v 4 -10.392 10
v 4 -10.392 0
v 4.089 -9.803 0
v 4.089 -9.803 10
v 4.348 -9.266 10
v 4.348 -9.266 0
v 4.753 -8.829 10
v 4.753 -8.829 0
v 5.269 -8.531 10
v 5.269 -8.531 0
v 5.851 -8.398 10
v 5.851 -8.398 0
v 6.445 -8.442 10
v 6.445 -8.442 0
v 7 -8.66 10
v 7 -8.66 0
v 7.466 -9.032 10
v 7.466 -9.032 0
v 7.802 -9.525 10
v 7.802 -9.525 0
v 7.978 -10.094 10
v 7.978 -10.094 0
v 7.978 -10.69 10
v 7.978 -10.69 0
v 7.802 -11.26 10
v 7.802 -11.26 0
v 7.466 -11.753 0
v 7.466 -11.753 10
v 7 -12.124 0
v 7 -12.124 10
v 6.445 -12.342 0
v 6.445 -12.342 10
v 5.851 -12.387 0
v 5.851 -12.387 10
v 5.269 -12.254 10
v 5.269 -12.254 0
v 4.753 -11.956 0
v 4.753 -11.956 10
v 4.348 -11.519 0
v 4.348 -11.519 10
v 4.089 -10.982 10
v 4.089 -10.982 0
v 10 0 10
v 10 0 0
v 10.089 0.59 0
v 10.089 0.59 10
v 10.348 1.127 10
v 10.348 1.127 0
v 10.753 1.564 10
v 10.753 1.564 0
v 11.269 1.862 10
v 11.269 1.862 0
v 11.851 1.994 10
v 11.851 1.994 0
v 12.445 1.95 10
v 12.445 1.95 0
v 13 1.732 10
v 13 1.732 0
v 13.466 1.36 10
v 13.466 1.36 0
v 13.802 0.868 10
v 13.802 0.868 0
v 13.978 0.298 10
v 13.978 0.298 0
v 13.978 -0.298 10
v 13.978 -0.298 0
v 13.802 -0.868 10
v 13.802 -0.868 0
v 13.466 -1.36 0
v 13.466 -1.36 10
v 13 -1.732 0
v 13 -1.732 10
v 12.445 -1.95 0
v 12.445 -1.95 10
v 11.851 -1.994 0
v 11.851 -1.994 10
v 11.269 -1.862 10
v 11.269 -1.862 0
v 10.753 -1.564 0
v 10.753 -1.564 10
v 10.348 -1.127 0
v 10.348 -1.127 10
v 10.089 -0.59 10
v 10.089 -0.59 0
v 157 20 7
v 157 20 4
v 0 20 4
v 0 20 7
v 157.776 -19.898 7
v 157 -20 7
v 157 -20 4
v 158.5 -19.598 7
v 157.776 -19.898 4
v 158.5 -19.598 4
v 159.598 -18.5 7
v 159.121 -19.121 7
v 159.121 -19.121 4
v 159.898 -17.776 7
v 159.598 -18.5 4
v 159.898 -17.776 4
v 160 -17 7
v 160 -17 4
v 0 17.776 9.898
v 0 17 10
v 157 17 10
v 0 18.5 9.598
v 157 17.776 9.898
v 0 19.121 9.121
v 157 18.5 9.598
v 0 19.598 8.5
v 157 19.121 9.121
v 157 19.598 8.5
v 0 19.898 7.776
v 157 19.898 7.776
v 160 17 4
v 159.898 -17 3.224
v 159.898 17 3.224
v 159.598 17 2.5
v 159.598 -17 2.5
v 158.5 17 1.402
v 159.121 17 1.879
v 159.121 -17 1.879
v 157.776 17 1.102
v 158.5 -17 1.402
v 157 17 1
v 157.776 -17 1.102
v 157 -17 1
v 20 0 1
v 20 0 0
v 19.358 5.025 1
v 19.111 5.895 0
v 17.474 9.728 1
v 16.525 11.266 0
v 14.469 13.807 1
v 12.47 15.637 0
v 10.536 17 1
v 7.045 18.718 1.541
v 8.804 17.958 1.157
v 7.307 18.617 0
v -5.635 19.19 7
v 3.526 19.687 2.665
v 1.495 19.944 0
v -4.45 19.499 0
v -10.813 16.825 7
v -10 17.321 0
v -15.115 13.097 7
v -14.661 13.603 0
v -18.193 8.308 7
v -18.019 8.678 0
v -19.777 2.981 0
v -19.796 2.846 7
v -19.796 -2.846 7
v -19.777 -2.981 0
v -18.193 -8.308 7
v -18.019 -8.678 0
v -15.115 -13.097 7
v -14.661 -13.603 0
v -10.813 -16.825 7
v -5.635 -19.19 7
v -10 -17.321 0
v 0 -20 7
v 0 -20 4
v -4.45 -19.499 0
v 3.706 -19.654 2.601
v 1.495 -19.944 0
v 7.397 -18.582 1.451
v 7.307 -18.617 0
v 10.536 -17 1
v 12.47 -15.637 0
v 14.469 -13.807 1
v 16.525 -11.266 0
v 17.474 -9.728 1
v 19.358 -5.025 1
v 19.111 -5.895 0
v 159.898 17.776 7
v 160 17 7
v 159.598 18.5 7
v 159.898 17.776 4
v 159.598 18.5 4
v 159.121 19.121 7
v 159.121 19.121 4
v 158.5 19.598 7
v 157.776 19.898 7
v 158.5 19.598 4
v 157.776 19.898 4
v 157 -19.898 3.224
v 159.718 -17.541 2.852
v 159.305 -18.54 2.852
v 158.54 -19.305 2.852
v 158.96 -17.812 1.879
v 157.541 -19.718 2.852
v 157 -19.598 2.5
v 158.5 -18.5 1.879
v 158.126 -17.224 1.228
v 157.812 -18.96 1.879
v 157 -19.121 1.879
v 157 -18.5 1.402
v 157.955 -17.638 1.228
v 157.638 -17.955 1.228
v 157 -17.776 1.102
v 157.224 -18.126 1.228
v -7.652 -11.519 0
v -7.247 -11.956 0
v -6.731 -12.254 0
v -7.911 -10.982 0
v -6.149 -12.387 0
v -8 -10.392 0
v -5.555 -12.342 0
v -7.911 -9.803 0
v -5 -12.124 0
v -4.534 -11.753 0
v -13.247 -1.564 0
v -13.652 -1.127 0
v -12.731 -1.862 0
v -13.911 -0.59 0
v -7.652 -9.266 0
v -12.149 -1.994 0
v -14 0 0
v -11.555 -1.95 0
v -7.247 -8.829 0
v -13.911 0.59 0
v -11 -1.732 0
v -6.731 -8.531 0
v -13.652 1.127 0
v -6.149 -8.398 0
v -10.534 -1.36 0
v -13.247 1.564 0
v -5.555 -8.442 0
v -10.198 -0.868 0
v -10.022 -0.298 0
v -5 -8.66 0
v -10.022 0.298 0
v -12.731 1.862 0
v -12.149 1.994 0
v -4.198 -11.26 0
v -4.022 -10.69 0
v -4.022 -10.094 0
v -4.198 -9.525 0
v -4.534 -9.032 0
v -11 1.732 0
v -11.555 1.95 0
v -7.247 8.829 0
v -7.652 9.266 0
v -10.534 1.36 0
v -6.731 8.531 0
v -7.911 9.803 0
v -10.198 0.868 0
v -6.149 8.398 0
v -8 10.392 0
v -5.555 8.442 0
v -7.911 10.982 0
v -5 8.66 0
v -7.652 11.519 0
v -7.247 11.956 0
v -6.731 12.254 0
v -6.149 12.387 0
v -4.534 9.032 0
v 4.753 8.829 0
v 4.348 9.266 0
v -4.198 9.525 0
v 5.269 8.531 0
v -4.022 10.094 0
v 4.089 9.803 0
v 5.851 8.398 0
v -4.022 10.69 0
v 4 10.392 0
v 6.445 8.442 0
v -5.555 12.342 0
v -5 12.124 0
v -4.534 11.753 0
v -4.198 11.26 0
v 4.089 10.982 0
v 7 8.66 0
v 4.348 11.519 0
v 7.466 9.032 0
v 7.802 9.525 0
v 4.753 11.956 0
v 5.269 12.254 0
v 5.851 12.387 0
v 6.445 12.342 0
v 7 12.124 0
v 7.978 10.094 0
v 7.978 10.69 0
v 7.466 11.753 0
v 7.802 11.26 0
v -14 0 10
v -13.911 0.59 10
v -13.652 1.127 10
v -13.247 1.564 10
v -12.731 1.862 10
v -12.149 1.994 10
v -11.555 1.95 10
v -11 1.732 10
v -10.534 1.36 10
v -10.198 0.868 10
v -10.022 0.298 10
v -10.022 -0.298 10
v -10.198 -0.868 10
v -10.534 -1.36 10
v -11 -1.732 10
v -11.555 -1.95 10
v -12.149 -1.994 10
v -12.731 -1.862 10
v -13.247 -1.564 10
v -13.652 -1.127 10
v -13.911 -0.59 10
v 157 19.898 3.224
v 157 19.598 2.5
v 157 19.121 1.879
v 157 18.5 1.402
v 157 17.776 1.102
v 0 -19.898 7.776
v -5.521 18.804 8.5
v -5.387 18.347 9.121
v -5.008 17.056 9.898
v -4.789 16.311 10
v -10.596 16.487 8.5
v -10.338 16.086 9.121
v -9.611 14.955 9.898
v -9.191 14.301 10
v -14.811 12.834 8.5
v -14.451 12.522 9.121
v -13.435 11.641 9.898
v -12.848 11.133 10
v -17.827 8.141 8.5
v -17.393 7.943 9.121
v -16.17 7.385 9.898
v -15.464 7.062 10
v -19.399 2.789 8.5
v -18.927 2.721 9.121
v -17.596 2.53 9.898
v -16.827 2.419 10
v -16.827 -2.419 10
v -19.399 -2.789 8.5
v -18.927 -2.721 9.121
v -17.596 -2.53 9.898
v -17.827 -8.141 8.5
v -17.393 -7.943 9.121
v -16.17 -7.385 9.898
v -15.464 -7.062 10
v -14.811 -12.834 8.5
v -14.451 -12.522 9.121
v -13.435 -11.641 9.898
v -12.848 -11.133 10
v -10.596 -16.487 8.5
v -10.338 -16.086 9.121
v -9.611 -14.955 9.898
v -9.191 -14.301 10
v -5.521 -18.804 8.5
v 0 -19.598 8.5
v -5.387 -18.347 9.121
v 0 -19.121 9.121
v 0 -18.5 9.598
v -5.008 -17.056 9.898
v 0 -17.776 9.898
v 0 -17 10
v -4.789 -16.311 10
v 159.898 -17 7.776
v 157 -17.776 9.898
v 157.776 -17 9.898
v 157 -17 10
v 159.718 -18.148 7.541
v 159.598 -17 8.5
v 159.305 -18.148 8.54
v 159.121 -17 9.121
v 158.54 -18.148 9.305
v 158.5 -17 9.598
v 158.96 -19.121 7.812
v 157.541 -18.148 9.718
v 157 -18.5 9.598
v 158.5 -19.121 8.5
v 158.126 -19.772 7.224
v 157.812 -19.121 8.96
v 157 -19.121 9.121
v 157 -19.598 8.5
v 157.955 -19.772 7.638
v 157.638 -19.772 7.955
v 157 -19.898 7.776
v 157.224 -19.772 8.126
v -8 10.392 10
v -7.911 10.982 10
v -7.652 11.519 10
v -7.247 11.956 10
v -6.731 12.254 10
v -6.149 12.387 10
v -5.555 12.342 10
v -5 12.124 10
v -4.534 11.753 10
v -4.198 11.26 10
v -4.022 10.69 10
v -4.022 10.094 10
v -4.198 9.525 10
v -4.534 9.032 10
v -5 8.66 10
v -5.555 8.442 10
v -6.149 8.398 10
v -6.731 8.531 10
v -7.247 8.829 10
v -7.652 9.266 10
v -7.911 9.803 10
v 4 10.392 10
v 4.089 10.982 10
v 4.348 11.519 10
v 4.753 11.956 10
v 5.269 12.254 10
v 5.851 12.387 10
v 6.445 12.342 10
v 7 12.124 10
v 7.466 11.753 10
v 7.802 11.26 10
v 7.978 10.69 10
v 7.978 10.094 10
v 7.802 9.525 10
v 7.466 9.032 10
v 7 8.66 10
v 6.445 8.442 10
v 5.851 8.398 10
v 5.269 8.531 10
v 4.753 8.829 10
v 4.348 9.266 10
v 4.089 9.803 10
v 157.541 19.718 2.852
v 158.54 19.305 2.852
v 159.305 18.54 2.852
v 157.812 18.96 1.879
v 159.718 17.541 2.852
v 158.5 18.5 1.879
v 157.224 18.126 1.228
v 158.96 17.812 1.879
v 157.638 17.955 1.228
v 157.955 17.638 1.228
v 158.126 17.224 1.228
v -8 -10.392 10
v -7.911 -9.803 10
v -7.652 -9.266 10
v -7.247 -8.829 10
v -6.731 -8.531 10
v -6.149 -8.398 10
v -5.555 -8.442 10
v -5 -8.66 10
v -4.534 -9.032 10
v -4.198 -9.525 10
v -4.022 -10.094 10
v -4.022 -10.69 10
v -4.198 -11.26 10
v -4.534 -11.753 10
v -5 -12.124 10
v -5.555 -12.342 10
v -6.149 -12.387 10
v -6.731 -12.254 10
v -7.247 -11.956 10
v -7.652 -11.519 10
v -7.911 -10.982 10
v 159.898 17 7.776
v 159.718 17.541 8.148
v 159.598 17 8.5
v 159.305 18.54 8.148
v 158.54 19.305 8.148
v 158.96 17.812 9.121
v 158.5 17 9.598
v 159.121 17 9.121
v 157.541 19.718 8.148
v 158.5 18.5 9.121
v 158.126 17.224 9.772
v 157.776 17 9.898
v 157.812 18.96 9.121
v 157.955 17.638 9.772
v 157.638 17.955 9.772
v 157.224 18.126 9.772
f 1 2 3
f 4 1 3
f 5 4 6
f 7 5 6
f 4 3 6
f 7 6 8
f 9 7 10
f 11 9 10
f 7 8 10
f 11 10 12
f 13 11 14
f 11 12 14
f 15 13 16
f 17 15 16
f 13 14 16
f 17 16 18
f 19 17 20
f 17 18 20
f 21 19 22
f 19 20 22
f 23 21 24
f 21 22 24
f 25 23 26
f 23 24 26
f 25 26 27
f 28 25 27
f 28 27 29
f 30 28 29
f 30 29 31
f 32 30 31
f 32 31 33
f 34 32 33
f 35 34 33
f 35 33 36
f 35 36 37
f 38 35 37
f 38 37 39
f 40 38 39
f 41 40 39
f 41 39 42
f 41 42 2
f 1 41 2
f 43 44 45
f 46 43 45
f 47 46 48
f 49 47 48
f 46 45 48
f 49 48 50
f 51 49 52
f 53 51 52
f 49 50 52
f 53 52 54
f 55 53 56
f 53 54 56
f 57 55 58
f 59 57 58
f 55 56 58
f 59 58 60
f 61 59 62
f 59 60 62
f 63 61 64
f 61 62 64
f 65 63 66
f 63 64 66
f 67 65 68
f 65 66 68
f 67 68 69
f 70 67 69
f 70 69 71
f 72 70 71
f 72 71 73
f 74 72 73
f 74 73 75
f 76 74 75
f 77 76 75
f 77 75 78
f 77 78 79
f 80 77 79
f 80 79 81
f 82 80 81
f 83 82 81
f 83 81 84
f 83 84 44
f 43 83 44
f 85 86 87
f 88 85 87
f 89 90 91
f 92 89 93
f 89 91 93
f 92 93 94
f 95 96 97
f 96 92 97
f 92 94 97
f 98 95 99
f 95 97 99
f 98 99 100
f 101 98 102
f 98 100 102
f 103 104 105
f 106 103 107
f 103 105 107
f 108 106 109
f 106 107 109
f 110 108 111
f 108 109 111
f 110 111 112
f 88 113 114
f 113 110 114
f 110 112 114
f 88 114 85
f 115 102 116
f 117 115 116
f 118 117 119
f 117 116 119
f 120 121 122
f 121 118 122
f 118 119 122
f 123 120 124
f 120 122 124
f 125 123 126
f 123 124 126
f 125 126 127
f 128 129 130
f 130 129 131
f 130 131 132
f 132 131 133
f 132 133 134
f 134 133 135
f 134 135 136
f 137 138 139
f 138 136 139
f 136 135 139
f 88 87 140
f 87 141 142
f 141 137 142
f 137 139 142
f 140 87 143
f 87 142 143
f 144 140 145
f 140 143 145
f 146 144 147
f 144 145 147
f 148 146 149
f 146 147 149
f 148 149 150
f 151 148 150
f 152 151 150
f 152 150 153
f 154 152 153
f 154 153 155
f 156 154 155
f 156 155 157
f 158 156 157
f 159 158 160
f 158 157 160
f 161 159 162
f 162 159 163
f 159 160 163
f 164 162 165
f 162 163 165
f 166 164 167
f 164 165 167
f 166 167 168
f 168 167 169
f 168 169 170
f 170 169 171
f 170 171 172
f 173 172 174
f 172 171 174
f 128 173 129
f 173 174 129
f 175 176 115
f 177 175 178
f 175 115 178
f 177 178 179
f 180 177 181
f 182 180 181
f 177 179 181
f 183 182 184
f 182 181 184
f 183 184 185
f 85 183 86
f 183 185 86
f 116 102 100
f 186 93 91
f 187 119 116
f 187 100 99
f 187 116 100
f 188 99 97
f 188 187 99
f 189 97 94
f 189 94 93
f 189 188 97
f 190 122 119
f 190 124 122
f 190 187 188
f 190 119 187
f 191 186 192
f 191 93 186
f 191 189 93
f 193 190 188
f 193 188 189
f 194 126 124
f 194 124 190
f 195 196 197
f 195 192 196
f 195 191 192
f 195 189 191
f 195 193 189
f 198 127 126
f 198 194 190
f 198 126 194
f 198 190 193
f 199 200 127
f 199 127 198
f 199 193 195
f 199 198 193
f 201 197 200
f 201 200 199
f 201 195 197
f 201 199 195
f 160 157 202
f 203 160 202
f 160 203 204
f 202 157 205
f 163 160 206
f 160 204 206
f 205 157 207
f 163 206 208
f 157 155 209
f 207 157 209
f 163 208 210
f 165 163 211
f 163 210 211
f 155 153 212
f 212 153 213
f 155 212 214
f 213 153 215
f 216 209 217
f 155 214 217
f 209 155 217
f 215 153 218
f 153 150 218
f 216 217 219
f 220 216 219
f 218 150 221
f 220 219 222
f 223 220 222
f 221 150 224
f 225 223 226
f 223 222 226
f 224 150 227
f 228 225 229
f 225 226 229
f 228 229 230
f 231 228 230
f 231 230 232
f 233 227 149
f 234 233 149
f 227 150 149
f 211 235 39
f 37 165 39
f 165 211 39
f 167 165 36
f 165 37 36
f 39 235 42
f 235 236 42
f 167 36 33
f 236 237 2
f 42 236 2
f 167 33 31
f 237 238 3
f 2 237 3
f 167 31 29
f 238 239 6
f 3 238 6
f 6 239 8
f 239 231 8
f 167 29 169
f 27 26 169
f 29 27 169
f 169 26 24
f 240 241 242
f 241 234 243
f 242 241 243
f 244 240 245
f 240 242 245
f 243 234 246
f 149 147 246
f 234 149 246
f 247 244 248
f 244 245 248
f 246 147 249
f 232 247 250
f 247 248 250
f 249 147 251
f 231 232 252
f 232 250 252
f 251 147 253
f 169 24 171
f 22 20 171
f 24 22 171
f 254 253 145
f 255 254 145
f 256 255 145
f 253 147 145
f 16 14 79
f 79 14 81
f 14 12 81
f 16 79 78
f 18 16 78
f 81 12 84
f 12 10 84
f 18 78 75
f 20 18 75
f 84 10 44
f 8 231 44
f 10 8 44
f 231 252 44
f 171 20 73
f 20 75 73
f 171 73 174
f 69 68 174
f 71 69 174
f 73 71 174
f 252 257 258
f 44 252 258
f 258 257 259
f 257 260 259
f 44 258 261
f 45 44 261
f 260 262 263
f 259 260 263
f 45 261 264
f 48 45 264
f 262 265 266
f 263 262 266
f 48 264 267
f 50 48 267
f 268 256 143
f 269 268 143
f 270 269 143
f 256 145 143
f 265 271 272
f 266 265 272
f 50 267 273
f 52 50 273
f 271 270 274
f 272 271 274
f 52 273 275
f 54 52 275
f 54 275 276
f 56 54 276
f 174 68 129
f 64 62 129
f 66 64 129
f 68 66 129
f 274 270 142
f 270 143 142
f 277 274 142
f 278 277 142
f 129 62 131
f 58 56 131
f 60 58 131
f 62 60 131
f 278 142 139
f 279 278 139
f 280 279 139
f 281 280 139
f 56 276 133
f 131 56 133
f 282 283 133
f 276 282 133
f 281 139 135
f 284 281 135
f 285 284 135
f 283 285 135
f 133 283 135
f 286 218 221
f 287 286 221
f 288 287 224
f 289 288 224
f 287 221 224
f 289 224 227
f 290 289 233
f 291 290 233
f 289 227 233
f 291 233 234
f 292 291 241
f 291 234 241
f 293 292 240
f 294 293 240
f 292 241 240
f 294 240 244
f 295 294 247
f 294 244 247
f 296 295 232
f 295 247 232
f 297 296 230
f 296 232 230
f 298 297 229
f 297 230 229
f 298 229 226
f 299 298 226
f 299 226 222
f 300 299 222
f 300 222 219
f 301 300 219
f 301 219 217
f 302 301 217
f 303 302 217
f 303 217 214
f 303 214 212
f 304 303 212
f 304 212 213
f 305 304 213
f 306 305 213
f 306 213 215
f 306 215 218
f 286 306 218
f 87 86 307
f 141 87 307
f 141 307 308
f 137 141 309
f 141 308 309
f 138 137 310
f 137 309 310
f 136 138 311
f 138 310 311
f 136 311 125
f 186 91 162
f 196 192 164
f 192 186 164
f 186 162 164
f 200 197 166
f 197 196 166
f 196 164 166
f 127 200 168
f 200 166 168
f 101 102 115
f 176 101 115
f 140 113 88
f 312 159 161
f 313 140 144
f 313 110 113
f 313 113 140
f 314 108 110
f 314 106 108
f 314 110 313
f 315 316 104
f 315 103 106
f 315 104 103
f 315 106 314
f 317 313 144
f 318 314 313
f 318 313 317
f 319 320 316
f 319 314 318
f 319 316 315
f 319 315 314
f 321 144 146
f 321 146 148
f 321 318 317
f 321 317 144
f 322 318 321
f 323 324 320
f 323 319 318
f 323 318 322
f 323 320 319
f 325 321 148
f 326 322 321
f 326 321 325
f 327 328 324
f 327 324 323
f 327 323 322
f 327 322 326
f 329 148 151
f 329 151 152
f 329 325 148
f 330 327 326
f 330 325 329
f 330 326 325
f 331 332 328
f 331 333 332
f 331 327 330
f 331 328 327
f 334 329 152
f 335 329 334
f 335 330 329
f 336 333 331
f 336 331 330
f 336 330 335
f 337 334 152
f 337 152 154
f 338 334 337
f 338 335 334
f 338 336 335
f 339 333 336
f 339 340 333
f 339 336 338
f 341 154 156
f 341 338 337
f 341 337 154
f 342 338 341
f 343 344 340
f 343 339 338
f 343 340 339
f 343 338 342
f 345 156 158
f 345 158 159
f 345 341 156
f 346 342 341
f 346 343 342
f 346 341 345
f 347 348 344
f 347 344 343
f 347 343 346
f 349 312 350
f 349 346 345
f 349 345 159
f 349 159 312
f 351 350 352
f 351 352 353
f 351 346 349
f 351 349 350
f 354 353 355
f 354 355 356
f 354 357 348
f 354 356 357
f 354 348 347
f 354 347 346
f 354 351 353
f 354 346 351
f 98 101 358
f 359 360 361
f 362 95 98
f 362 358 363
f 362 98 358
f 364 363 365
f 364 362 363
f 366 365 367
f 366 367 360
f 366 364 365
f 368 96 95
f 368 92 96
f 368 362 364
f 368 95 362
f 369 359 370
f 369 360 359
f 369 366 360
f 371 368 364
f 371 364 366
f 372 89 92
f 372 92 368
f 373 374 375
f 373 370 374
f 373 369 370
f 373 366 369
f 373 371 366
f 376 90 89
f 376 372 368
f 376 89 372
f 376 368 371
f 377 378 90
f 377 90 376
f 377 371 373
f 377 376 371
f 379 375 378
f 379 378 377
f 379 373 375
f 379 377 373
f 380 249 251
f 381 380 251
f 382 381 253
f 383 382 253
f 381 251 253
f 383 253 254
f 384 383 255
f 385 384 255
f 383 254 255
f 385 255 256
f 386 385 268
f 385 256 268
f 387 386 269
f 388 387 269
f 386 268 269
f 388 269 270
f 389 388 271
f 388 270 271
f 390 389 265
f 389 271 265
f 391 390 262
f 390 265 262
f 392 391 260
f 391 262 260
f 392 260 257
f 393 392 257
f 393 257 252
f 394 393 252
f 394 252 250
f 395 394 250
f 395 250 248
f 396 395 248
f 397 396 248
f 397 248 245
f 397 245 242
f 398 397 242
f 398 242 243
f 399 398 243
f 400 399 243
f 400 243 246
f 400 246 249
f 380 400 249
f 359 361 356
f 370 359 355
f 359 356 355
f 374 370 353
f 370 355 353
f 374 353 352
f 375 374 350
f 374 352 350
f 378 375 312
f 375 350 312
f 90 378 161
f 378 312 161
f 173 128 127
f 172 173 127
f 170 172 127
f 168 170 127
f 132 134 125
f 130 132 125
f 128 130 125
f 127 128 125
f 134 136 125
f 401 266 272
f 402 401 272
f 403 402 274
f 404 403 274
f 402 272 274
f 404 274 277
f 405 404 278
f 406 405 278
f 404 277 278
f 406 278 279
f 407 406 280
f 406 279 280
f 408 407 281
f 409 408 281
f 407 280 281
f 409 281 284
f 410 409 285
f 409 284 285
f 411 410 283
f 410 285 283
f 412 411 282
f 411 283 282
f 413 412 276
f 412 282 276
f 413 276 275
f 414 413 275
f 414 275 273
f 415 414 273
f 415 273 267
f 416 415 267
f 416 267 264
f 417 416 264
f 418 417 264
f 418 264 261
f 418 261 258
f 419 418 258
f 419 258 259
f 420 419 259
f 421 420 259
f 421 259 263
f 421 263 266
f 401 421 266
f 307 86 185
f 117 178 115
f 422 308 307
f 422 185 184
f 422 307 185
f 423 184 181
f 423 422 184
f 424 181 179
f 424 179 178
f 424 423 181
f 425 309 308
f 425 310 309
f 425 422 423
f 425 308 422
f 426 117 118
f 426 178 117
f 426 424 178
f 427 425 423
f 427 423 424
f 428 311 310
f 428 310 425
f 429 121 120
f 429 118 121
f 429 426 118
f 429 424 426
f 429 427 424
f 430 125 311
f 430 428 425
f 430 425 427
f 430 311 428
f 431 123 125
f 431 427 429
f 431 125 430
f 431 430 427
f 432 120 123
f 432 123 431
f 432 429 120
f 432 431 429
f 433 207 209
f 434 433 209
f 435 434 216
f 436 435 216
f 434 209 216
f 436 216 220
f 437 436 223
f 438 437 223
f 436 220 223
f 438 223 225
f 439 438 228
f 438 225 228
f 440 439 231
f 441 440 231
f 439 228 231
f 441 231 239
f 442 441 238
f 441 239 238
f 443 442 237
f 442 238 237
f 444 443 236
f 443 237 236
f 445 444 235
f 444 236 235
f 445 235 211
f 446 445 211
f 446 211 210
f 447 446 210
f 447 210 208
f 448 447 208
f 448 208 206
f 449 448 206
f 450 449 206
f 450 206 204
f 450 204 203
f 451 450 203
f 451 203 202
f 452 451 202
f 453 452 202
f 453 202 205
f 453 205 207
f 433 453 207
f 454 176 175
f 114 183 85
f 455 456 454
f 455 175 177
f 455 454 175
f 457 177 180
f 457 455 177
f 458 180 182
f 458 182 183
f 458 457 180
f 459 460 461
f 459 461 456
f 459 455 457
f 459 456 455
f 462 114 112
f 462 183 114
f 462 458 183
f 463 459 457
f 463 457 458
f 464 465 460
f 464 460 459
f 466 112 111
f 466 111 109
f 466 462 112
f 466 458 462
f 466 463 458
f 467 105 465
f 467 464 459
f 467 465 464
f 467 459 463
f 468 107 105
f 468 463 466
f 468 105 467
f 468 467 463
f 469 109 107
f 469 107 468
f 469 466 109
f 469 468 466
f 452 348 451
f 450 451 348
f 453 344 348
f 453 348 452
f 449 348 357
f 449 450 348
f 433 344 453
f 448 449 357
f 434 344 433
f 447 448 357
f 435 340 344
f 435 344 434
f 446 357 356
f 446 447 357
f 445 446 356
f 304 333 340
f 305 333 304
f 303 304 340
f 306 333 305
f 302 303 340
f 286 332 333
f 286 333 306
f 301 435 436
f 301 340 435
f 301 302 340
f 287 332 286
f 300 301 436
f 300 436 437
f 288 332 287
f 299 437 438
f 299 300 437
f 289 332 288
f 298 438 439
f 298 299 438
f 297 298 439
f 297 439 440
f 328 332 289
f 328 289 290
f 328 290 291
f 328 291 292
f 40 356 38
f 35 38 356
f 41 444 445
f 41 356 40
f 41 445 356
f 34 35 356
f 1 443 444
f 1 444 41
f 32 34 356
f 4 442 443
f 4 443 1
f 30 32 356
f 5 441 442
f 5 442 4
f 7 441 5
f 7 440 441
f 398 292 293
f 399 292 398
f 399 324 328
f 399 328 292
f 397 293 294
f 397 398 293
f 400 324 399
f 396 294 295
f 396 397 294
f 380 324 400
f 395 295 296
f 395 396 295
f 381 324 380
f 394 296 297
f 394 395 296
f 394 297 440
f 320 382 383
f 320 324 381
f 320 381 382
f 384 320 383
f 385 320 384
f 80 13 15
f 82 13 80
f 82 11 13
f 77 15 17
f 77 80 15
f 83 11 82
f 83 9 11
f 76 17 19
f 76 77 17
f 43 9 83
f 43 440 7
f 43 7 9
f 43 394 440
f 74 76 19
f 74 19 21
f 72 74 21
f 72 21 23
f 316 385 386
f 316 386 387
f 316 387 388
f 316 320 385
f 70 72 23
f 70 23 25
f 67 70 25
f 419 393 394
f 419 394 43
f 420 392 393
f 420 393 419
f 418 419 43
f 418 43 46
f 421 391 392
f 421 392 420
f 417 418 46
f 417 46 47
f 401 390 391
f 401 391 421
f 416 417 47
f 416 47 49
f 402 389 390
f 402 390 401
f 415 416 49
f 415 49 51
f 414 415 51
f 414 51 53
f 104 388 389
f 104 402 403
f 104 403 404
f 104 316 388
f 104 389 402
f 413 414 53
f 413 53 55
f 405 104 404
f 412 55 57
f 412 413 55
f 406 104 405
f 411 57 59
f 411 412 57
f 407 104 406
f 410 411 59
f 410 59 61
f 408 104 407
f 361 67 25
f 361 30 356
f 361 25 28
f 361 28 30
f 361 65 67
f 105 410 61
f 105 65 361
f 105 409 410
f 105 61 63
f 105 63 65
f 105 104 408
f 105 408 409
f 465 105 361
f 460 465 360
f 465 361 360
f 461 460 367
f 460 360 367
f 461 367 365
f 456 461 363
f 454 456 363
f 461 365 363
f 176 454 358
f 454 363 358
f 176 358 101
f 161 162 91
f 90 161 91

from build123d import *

# Parameters (mm, degrees)
SKETCH8_R             = 20
BOSS_EXTRUDE6_DEPTH   = 10
BOSS_EXTRUDE7_START   = 1
BOSS_EXTRUDE7_DEPTH   = 9
F_4_0MM_DOWEL_HOLE2_D = 4
FILLET4_R             = 3


with BuildPart() as part:
    # Sketch8 → Boss-Extrude6 (new body)
    with BuildSketch(Plane.XY):
        Circle(SKETCH8_R)
    extrude(amount=BOSS_EXTRUDE6_DEPTH)

    # Sketch8<4> → Boss-Extrude7 (add)
    with BuildSketch(Plane.XY.offset(BOSS_EXTRUDE7_START)):
        with BuildLine():
            Line((160, 20), (0, 20))
            ThreePointArc((0, 20), (14.142135624, 14.142135624), (20, 0))
            ThreePointArc((20, 0), (14.142135624, -14.142135624), (0, -20))
            Line((0, -20), (160, -20))
            Line((160, -20), (160, 20))
        make_face()
    extrude(amount=BOSS_EXTRUDE7_DEPTH)

    # Ø4.0mm Dowel Hole2 (through all)
    with Locations(Plane.XY.offset(10)):
        with Locations((6, 10.392304845), (12, 0), (6, -10.392304845), (-6, -10.392304845), (-12, 0), (-6, 10.392304845)):
            Hole(F_4_0MM_DOWEL_HOLE2_D / 2)

    # Fillet4
    # the kernel refuses this fillet: 3 mm, written as the material it takes off along each edge
    with BuildSketch(Plane(origin=(157, 17, 4), x_dir=(1, 0, 0), z_dir=(0, 0, -1))) as fillet4_piece_1_section:
        Polygon((0, 0), (FILLET4_R, 0), (FILLET4_R, -FILLET4_R), (0, -FILLET4_R), align=None)
    fillet4_piece_1 = extrude(amount=FILLET4_R, mode=Mode.PRIVATE)
    fillet4_piece_1 = fillet4_piece_1 - Plane(origin=(157, 17, 4), x_dir=(-0.7071067811865475, -0.7071067811865475, 0), z_dir=(0, 0, -1)) * Sphere(FILLET4_R, mode=Mode.PRIVATE)
    add(fillet4_piece_1, mode=Mode.SUBTRACT)
    with BuildSketch(Plane(origin=(157, 17, 7), x_dir=(1, 0, 0), z_dir=(0, 0, 1))) as fillet4_piece_2_section:
        Polygon((0, 0), (FILLET4_R, 0), (FILLET4_R, FILLET4_R), (0, FILLET4_R), align=None)
    fillet4_piece_2 = extrude(amount=FILLET4_R, mode=Mode.PRIVATE)
    fillet4_piece_2 = fillet4_piece_2 - Plane(origin=(157, 17, 7), x_dir=(-0.7071067811865475, -0.7071067811865475, 0), z_dir=(0, 0, 1)) * Sphere(FILLET4_R, mode=Mode.PRIVATE)
    add(fillet4_piece_2, mode=Mode.SUBTRACT)
    with BuildSketch(Plane(origin=(157, -17, 4), x_dir=(0, -1, 0), z_dir=(0, 0, -1))) as fillet4_piece_3_section:
        Polygon((0, 0), (FILLET4_R, 0), (FILLET4_R, -FILLET4_R), (0, -FILLET4_R), align=None)
    fillet4_piece_3 = extrude(amount=FILLET4_R, mode=Mode.PRIVATE)
    fillet4_piece_3 = fillet4_piece_3 - Plane(origin=(157, -17, 4), x_dir=(-0.7071067811865475, 0.7071067811865475, 0), z_dir=(0, 0, -1)) * Sphere(FILLET4_R, mode=Mode.PRIVATE)
    add(fillet4_piece_3, mode=Mode.SUBTRACT)
    with BuildSketch(Plane(origin=(157, -17, 7), x_dir=(0, 0, 1), z_dir=(0, -1, 0))) as fillet4_piece_4_section:
        Polygon((0, 0), (FILLET4_R, 0), (FILLET4_R, -FILLET4_R), (0, -FILLET4_R), align=None)
    fillet4_piece_4 = extrude(amount=FILLET4_R, mode=Mode.PRIVATE)
    fillet4_piece_4 = fillet4_piece_4 - Plane(origin=(157, -17, 7), x_dir=(-0.7071067811865475, 0, -0.7071067811865475), z_dir=(0, -1, 0)) * Sphere(FILLET4_R, mode=Mode.PRIVATE)
    add(fillet4_piece_4, mode=Mode.SUBTRACT)
    with BuildSketch(Plane(origin=(160, 20, 4), x_dir=(-1, 0, 0), z_dir=(0, 0, 1))) as fillet4_piece_5:
        with BuildLine():
            CenterArc((FILLET4_R, FILLET4_R), FILLET4_R, 180, 90)
            Line((0, FILLET4_R), (0, 0))
            Line((0, 0), (FILLET4_R, 0))
        make_face()
    extrude(amount=3, mode=Mode.SUBTRACT)
    with BuildSketch(Plane(origin=(157, 20, 1), x_dir=(0, -1, 0), z_dir=(-1, 0, 0))) as fillet4_piece_6_section:
        with BuildLine():
            CenterArc((FILLET4_R, FILLET4_R), FILLET4_R, 180, 90)
            Line((0, FILLET4_R), (0, 0))
            Line((0, 0), (FILLET4_R, 0))
        make_face()
    fillet4_piece_6 = extrude(amount=164.5, mode=Mode.PRIVATE)
    fillet4_piece_6 = fillet4_piece_6 - Plane(origin=(0, 0, 1.692410686), x_dir=(1, 0, 0), z_dir=(0, 0, -1)) * Cylinder(20, 341, mode=Mode.PRIVATE)
    add(fillet4_piece_6, mode=Mode.SUBTRACT)
    with BuildSketch(Plane(origin=(160, -17, 1), x_dir=(-1, 0, 0), z_dir=(0, 1, 0))) as fillet4_piece_7:
        with BuildLine():
            CenterArc((FILLET4_R, FILLET4_R), FILLET4_R, 180, 90)
            Line((0, FILLET4_R), (0, 0))
            Line((0, 0), (FILLET4_R, 0))
        make_face()
    extrude(amount=34, mode=Mode.SUBTRACT)
    with BuildSketch(Plane(origin=(-7.5, -20, 1), x_dir=(0, 1, 0), z_dir=(1, 0, 0))) as fillet4_piece_8_section:
        with BuildLine():
            CenterArc((FILLET4_R, FILLET4_R), FILLET4_R, 180, 90)
            Line((0, FILLET4_R), (0, 0))
            Line((0, 0), (FILLET4_R, 0))
        make_face()
    fillet4_piece_8 = extrude(amount=164.5, mode=Mode.PRIVATE)
    fillet4_piece_8 = fillet4_piece_8 - Plane(origin=(0, 0, 1.692408431), x_dir=(1, 0, 0), z_dir=(0, 0, -1)) * Cylinder(20, 341, mode=Mode.PRIVATE)
    add(fillet4_piece_8, mode=Mode.SUBTRACT)
    with BuildSketch(Plane(origin=(0, 0, 10), x_dir=(0, 1, 0), z_dir=(1, 0, 0))) as fillet4_piece_9:
        with BuildLine():
            CenterArc((20 - FILLET4_R, -FILLET4_R), FILLET4_R, 0, 90)
            Line((20 - FILLET4_R, 0), (20, 0))
            Line((20, 0), (20, -FILLET4_R))
        make_face()
    revolve(axis=Axis((0, 0, 10), (0, 0, 1)), revolution_arc=180, mode=Mode.SUBTRACT)
    with BuildSketch(Plane(origin=(0, -20, 10), x_dir=(0, 0, -1), z_dir=(1, 0, 0))) as fillet4_piece_10:
        with BuildLine():
            CenterArc((FILLET4_R, FILLET4_R), FILLET4_R, 180, 90)
            Line((0, FILLET4_R), (0, 0))
            Line((0, 0), (FILLET4_R, 0))
        make_face()
    extrude(amount=157, mode=Mode.SUBTRACT)
    with BuildSketch(Plane(origin=(160, -17, 10), x_dir=(-1, 0, 0), z_dir=(0, 1, 0))) as fillet4_piece_11:
        with BuildLine():
            CenterArc((FILLET4_R, -FILLET4_R), FILLET4_R, 90, 90)
            Line((0, -FILLET4_R), (0, 0))
            Line((0, 0), (FILLET4_R, 0))
        make_face()
    extrude(amount=34, mode=Mode.SUBTRACT)
    with BuildSketch(Plane(origin=(160, -20, 4), x_dir=(-1, 0, 0), z_dir=(0, 0, 1))) as fillet4_piece_12:
        with BuildLine():
            CenterArc((FILLET4_R, -FILLET4_R), FILLET4_R, 90, 90)
            Line((0, -FILLET4_R), (0, 0))
            Line((0, 0), (FILLET4_R, 0))
        make_face()
    extrude(amount=3, mode=Mode.SUBTRACT)
    with BuildSketch(Plane(origin=(157, 20, 10), x_dir=(0, -1, 0), z_dir=(-1, 0, 0))) as fillet4_piece_13:
        with BuildLine():
            CenterArc((FILLET4_R, -FILLET4_R), FILLET4_R, 90, 90)
            Line((0, -FILLET4_R), (0, 0))
            Line((0, 0), (FILLET4_R, 0))
        make_face()
    extrude(amount=157, mode=Mode.SUBTRACT)


solid = part.part
